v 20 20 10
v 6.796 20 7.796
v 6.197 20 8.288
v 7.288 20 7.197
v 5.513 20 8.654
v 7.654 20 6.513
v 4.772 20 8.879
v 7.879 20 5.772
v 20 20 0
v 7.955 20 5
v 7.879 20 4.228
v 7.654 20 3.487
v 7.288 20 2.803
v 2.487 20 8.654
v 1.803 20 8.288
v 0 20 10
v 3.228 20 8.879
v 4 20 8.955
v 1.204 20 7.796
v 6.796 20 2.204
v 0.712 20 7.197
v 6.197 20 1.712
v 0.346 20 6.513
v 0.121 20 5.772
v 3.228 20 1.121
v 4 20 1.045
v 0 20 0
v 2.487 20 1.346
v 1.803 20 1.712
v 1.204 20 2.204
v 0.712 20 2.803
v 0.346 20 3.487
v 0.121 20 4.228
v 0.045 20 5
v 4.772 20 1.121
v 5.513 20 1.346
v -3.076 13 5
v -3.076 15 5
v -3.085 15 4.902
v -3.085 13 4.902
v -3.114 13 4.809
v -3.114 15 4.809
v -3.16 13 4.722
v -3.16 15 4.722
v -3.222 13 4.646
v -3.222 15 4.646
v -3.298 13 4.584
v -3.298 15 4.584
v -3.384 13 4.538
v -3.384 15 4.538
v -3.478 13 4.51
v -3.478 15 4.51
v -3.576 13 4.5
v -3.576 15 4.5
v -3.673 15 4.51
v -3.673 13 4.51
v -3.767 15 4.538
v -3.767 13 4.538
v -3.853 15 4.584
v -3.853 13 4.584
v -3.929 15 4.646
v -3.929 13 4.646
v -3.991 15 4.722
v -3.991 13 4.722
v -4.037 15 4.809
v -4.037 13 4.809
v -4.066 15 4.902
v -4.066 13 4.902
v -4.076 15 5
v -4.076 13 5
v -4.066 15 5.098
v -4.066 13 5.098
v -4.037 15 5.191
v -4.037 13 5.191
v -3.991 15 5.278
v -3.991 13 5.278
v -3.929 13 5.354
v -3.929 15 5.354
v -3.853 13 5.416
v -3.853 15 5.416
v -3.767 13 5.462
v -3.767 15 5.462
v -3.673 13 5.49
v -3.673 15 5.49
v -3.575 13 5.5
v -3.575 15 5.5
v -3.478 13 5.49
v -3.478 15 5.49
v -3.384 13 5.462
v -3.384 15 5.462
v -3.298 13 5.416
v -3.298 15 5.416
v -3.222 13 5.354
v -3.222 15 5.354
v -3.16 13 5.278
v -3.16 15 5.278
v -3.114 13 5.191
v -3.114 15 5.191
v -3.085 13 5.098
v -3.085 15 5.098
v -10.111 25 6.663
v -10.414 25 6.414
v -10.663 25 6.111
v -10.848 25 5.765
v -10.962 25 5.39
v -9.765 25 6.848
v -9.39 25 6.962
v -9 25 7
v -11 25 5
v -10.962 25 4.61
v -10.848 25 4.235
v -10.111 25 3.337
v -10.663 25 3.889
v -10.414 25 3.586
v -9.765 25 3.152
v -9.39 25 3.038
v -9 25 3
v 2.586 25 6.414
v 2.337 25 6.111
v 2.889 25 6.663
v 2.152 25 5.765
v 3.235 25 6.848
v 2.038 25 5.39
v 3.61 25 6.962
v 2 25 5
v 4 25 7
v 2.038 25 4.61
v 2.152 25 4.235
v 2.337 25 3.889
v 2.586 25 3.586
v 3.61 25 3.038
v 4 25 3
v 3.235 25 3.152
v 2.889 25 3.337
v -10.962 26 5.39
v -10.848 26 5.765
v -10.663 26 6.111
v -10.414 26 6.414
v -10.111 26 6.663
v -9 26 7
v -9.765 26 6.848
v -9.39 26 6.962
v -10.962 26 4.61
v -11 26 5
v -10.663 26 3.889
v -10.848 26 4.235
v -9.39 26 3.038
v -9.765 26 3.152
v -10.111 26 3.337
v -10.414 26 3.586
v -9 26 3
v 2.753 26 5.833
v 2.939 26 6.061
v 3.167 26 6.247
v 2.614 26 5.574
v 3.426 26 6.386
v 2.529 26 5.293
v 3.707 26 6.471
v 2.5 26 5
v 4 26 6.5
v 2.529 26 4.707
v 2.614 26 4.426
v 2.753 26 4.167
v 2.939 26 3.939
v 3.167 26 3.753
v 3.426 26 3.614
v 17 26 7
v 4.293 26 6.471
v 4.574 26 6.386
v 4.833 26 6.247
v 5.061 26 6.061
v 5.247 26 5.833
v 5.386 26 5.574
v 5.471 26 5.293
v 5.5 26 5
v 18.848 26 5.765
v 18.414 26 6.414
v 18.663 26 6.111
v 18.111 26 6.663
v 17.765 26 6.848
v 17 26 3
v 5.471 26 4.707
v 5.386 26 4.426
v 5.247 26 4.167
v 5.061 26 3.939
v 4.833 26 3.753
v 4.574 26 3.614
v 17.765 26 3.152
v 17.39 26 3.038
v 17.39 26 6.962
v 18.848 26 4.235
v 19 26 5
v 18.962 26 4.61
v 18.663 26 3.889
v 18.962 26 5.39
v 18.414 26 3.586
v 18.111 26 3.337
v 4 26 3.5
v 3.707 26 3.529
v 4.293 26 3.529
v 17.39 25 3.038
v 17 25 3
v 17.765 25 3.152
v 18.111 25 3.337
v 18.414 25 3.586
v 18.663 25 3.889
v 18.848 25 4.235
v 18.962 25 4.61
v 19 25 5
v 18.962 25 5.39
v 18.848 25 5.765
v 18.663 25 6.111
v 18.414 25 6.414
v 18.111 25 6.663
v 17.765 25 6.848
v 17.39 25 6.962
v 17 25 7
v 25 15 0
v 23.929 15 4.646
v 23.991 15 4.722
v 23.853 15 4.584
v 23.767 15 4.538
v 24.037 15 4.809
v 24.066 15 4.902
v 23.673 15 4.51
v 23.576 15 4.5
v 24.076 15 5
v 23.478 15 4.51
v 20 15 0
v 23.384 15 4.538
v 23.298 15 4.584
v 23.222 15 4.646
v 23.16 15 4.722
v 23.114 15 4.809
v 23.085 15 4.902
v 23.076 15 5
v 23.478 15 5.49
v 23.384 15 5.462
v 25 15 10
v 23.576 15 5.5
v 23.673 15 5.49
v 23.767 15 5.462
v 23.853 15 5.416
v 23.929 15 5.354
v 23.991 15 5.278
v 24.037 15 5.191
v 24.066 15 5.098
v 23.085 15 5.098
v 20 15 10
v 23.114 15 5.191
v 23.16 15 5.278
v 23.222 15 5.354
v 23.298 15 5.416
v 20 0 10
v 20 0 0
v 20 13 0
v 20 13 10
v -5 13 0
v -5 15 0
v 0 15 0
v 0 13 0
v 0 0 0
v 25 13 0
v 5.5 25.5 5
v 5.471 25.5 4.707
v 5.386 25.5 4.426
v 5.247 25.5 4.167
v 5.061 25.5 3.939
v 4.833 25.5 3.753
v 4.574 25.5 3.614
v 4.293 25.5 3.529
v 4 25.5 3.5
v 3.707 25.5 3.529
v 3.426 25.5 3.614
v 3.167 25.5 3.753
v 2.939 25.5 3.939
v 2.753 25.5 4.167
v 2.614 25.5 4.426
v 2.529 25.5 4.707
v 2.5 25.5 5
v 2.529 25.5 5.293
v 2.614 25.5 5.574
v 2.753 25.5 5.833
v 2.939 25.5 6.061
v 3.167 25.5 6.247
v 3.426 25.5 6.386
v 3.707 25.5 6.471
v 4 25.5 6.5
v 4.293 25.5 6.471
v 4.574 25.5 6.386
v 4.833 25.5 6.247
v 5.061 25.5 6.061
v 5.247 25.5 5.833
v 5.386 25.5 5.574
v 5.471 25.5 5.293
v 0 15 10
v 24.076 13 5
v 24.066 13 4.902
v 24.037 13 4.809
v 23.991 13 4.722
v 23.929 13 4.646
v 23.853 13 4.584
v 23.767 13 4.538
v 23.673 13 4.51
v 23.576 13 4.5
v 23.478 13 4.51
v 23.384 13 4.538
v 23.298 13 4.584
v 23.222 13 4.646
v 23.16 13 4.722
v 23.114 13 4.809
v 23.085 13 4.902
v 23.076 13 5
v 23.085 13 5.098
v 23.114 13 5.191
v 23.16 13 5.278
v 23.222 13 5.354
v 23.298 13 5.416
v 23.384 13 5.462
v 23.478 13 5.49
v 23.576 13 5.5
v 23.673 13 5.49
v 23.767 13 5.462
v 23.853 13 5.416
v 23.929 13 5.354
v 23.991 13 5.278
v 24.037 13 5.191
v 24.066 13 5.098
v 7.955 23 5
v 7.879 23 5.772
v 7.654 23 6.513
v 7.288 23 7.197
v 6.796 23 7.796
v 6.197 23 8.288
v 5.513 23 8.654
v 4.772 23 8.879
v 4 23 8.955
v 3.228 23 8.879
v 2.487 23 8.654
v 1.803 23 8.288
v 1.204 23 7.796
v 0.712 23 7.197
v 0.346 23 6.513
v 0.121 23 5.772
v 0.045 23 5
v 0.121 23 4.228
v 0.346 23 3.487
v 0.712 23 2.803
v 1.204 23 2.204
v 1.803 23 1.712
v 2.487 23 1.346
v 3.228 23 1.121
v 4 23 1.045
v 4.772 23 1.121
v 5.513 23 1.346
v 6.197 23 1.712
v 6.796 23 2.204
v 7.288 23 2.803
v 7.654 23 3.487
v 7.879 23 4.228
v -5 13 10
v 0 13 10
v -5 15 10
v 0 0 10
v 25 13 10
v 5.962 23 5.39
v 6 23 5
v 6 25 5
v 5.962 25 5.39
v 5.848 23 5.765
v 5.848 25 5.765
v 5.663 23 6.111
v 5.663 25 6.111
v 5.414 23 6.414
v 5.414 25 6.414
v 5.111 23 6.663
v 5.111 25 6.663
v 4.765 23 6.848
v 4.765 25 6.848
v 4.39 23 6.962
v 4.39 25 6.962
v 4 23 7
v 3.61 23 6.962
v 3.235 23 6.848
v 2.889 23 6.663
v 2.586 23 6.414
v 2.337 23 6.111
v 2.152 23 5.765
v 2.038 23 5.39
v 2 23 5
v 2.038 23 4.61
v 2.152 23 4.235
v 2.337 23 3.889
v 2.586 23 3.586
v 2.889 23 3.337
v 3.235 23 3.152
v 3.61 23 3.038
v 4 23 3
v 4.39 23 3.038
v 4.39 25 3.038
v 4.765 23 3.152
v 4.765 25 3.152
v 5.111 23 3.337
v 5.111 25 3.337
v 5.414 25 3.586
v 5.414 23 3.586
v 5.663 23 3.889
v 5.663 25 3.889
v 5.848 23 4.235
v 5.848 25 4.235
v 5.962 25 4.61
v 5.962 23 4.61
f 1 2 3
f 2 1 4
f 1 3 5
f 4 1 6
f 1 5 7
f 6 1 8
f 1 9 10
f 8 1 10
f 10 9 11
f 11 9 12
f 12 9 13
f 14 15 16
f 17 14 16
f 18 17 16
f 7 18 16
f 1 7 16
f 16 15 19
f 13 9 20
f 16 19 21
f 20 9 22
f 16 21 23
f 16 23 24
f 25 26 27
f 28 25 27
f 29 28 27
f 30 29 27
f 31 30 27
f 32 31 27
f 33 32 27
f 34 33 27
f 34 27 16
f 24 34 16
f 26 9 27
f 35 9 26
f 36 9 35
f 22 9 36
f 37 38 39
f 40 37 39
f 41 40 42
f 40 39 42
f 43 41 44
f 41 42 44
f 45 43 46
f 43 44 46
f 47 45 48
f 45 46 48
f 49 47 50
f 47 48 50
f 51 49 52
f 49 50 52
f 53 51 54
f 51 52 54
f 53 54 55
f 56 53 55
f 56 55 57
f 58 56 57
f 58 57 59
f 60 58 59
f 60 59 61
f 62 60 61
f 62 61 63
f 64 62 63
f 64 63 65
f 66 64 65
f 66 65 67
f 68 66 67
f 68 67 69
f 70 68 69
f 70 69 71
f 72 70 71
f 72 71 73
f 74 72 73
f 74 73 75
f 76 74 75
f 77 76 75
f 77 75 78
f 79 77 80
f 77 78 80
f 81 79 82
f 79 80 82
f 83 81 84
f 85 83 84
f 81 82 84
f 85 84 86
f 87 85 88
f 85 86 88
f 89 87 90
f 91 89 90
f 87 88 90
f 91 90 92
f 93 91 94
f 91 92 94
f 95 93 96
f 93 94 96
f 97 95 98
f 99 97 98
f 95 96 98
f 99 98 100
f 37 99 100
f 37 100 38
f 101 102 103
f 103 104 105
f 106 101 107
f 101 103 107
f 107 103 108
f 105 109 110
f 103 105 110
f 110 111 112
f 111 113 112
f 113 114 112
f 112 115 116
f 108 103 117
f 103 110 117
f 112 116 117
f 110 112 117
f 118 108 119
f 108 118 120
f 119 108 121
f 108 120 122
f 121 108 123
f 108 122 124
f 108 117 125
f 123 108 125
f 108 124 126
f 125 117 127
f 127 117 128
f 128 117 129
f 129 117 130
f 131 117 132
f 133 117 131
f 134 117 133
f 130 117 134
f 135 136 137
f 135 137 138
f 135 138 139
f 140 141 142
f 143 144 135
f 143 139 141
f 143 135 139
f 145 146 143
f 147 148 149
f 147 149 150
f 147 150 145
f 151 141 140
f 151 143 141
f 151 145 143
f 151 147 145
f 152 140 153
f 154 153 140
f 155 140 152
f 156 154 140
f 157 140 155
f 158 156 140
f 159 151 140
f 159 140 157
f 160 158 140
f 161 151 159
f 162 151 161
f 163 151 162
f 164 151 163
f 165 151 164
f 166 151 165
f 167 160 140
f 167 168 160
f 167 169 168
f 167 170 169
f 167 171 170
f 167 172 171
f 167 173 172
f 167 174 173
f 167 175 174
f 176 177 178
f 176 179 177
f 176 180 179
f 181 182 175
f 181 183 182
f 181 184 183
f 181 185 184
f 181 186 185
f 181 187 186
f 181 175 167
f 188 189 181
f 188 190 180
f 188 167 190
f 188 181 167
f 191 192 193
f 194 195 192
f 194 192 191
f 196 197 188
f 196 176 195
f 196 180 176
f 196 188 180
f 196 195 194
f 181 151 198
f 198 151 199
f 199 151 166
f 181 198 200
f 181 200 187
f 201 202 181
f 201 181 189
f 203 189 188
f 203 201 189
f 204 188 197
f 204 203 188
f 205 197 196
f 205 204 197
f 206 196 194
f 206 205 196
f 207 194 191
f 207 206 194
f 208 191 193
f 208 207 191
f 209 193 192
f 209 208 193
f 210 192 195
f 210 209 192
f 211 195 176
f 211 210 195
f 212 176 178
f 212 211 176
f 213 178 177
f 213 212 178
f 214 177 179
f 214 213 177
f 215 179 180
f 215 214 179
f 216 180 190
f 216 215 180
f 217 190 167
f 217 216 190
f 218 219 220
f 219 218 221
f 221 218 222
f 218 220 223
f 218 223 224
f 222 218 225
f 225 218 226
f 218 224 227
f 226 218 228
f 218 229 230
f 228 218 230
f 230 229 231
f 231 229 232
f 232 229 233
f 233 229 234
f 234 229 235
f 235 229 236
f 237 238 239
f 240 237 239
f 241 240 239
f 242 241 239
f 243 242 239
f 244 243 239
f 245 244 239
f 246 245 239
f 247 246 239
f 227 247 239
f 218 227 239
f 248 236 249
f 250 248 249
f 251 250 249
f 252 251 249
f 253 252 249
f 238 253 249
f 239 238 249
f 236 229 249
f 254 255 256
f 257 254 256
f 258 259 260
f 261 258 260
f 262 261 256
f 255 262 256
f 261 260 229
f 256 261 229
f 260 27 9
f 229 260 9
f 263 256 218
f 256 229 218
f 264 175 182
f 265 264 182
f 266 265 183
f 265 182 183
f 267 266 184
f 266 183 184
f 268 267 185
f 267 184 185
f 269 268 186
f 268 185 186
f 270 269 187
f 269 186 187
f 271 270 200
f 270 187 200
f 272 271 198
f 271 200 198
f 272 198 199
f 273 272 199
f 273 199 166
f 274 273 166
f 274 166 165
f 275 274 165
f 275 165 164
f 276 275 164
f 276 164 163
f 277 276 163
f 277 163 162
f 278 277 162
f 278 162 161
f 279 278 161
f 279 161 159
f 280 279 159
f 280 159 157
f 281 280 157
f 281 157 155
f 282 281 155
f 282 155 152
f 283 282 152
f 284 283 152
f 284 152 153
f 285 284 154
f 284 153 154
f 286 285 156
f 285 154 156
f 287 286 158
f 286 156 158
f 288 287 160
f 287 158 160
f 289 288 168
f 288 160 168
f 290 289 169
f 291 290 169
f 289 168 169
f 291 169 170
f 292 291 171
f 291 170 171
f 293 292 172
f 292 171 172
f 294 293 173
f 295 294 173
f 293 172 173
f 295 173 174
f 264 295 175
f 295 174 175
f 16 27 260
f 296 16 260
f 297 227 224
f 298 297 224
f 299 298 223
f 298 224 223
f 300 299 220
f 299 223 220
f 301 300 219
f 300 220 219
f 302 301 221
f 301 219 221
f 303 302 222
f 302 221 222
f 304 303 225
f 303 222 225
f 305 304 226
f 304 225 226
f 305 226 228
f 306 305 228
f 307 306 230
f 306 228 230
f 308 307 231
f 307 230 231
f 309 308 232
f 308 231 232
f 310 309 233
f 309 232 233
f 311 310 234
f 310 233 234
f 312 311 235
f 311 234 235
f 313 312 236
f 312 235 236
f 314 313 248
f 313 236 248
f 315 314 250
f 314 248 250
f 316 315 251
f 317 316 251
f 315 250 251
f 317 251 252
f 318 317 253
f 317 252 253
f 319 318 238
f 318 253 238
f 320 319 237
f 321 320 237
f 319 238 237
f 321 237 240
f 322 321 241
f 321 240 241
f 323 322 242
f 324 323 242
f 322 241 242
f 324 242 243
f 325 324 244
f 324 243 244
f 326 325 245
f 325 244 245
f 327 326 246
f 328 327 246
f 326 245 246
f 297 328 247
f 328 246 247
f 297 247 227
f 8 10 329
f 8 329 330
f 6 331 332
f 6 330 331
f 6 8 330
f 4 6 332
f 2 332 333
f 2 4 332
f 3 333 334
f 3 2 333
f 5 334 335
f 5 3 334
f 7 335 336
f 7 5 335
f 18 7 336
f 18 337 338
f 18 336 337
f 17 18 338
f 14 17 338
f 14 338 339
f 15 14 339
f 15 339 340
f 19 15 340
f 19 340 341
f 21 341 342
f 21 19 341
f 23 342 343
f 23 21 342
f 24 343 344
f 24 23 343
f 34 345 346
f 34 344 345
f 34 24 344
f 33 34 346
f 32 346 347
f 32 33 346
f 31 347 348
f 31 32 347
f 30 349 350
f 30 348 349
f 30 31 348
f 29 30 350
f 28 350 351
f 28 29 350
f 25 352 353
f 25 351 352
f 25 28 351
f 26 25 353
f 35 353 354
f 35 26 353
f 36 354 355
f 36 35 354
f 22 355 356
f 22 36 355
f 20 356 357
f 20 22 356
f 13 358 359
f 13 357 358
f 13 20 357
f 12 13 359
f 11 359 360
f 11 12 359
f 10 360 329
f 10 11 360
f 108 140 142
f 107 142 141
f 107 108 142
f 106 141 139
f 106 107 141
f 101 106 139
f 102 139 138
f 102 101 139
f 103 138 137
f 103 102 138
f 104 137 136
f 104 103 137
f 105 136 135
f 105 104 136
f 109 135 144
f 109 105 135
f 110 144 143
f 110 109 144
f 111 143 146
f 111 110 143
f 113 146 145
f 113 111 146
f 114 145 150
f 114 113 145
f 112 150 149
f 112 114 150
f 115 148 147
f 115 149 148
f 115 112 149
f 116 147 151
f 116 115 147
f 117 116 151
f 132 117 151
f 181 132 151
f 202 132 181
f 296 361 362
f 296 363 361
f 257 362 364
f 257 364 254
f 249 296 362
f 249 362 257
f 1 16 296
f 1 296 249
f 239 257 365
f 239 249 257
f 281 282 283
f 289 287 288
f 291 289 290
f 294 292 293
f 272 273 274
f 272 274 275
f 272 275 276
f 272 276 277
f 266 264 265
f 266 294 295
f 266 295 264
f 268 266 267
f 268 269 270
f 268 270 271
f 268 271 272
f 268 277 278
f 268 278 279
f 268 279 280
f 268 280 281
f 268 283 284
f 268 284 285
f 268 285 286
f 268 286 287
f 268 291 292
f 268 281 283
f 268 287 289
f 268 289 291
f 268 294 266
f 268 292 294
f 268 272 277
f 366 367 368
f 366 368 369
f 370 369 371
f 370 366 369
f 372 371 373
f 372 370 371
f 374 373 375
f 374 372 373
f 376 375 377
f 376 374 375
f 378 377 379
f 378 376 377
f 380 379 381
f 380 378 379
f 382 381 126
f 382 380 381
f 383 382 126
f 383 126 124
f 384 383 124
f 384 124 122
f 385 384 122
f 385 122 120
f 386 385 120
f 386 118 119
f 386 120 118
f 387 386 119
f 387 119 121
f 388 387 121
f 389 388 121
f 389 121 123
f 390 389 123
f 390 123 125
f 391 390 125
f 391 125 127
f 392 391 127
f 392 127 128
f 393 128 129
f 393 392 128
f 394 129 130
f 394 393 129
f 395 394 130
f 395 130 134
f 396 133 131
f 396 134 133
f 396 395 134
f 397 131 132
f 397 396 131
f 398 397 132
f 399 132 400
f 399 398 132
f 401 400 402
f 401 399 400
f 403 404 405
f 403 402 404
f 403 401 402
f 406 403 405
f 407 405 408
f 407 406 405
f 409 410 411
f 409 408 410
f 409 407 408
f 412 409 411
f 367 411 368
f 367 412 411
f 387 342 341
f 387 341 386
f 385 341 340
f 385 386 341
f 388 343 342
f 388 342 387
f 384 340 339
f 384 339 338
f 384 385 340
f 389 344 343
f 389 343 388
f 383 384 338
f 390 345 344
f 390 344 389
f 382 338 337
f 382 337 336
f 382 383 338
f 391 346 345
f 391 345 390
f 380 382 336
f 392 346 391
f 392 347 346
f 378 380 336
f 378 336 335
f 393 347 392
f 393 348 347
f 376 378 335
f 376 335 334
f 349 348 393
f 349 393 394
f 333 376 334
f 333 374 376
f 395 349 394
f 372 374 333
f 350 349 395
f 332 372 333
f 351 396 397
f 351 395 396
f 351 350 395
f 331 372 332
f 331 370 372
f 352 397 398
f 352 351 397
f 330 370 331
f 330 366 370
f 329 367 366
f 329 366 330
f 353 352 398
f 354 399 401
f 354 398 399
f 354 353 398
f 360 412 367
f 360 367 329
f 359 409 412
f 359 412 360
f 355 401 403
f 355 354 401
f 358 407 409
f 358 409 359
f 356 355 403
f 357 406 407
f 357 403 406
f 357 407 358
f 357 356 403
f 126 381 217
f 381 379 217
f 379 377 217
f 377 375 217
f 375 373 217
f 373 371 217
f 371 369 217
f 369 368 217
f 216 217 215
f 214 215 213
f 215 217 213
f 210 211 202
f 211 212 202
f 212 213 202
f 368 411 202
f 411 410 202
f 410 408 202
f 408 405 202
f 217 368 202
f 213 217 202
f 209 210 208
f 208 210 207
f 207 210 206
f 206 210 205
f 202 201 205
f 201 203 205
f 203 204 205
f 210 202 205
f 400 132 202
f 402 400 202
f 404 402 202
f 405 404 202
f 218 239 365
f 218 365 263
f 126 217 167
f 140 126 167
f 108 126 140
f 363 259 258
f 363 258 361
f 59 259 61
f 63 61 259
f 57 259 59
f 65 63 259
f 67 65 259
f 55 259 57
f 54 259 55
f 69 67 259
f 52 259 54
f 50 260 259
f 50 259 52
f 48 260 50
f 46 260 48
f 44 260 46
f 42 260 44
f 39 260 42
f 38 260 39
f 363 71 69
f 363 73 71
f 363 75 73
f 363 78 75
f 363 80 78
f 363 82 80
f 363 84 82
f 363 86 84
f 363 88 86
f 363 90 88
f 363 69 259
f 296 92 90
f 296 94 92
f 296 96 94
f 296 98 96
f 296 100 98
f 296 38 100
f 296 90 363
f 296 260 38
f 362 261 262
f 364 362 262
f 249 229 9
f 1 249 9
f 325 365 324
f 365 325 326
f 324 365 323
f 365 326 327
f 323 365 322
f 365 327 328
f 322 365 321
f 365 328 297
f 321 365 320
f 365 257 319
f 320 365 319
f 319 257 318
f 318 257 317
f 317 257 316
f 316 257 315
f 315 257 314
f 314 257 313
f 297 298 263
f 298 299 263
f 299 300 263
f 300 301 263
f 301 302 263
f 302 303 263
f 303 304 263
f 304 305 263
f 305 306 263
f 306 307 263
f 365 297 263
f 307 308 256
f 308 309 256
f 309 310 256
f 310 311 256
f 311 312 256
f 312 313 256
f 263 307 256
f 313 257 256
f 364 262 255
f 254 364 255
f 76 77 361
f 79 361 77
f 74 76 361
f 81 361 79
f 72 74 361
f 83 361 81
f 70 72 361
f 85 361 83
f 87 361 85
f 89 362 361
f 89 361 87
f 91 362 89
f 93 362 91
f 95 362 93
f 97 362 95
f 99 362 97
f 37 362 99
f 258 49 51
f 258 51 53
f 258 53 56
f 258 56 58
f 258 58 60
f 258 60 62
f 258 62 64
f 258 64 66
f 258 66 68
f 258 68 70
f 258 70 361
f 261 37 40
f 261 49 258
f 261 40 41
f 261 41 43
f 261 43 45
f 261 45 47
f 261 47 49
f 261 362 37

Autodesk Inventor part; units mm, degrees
ref_plane "YZ Plane" through (0, 0, 0) normal (1, 0, 0) x (0, 1, 0)
ref_plane "XZ Plane" through (0, 0, 0) normal (0, 1, 0) x (-1, 0, 0)
ref_plane "XY Plane" through (0, 0, 0) normal (0, 0, 1) x (1, 0, 0)
sketch "Sketch1" plane through (0, 0, 0) normal (0, 0, 1) x (1, 0, 0)
  line L0 (0, 0) -> (20, 0)
  line L1 (20, 0) -> (20, 20)
  line L2 (20, 20) -> (0, 20)
  line L3 (0, 20) -> (0, 0)
  dimension "d0" = 20
  dimension "d1" = 20
extrude "Extrusion1" add sketch "Sketch1" along normal blind 10
sketch "Sketch2" plane through (20, 0, 0) normal (1, 0, 0) x (0, 0, -1)
  line L0 (0, 0) -> (0, 20) projected
  line L1 (0, 15) -> (-10, 15)
  line L2 (-10, 15) -> (-10, 13)
  line L3 (-10, 13) -> (0, 13)
  line L4 (0, 13) -> (0, 15)
  dimension "d4" = 10
  dimension "d5" = 2
extrude "Extrusion2" add sketch "Sketch2" along normal blind 5
sketch "Sketch3" plane through (0, 0, 0) normal (-1, 0, 0) x (0, 0, 1)
  line L0 (10, 15) -> (10, 13) projected
  line L1 (0, 15) -> (10, 15)
  line L2 (10, 15) -> (10, 13)
  line L3 (10, 13) -> (0, 13)
  line L4 (0, 13) -> (0, 15)
  point P0 (0, 0)
  dimension "d8" = 2
extrude "Extrusion3" add sketch "Sketch3" along normal blind 5
sketch "Sketch4" plane through (20, 15, 10) normal (0, 1, 0) x (1, 0, 0)
  circle A0 centre (-23.5755, 5) radius 0.5
  line L0 (0, 10) -> (-20, 10) projected
  line L1 (-10, 10) -> (-10, 0.1248)
  line L2 (-10, 0.1248) -> (-10, 10)
  circle A1 centre (3.5755, 5) radius 0.5
  dimension "d11" = 1
extrude "Extrusion4" cut sketch "Sketch4" against normal through all
sketch "Sketch5" plane through (0, 20, 0) normal (0, 1, 0) x (1, 0, 0)
  circle A0 centre (4, -5) radius 3.9548
  point P0 (0, 0)
extrude "Extrusion5" add sketch "Sketch5" along normal blind 3
sketch "Sketch6" plane through (4, 23, 5) normal (0, 1, 0) x (1, 0, 0)
  circle A0 centre (0, 0) radius 2
  point P0 (-4, 5)
  dimension "d16" = 4
extrude "Extrusion6" add sketch "Sketch6" along normal blind 2
sketch "Sketch7" plane through (4, 25, 5) normal (0, 1, 0) x (1, 0, 0)
  circle A0 centre (0, 0) radius 2 projected
  line L0 (0, 2) -> (13, 2)
  line L1 (15, 0) -> (15, 0)
  line L2 (13, -2) -> (0, -2)
  line L3 (0, -2) -> (0, 2)
  line L4 (0, 2) -> (-13, 2)
  line L5 (-15, 0) -> (-15, 0)
  line L6 (-13, -2) -> (0, -2)
  line L7 (0, -2) -> (0, 2)
  arc A1 (-13, 2) -> (-15, 0) centre (-13, 0) ccw
  arc A2 (-15, 0) -> (-13, -2) centre (-13, 0) ccw
  arc A3 (13, -2) -> (15, 0) centre (13, 0) ccw
  arc A4 (15, 0) -> (13, 2) centre (13, 0) ccw
  point P0 (-4, 5)
  point P1 (15, -2)
  point P2 (-15, -2)
  point P3 (0, -2)
  point P4 (15, 0)
  dimension "d19" = 15
  dimension "d20" = 15
  dimension "d21" = 2
extrude "Extrusion7" add sketch "Sketch7" along normal blind 1
sketch "Sketch8" plane through (4, 26, 5) normal (0, 1, 0) x (1, 0, 0)
  circle A0 centre (0, 0) radius 1.5
  point P0 (-4, 5)
  dimension "d24" = 3
extrude "Extrusion8" cut sketch "Sketch8" against normal blind 0.5
properties part number "servo"
